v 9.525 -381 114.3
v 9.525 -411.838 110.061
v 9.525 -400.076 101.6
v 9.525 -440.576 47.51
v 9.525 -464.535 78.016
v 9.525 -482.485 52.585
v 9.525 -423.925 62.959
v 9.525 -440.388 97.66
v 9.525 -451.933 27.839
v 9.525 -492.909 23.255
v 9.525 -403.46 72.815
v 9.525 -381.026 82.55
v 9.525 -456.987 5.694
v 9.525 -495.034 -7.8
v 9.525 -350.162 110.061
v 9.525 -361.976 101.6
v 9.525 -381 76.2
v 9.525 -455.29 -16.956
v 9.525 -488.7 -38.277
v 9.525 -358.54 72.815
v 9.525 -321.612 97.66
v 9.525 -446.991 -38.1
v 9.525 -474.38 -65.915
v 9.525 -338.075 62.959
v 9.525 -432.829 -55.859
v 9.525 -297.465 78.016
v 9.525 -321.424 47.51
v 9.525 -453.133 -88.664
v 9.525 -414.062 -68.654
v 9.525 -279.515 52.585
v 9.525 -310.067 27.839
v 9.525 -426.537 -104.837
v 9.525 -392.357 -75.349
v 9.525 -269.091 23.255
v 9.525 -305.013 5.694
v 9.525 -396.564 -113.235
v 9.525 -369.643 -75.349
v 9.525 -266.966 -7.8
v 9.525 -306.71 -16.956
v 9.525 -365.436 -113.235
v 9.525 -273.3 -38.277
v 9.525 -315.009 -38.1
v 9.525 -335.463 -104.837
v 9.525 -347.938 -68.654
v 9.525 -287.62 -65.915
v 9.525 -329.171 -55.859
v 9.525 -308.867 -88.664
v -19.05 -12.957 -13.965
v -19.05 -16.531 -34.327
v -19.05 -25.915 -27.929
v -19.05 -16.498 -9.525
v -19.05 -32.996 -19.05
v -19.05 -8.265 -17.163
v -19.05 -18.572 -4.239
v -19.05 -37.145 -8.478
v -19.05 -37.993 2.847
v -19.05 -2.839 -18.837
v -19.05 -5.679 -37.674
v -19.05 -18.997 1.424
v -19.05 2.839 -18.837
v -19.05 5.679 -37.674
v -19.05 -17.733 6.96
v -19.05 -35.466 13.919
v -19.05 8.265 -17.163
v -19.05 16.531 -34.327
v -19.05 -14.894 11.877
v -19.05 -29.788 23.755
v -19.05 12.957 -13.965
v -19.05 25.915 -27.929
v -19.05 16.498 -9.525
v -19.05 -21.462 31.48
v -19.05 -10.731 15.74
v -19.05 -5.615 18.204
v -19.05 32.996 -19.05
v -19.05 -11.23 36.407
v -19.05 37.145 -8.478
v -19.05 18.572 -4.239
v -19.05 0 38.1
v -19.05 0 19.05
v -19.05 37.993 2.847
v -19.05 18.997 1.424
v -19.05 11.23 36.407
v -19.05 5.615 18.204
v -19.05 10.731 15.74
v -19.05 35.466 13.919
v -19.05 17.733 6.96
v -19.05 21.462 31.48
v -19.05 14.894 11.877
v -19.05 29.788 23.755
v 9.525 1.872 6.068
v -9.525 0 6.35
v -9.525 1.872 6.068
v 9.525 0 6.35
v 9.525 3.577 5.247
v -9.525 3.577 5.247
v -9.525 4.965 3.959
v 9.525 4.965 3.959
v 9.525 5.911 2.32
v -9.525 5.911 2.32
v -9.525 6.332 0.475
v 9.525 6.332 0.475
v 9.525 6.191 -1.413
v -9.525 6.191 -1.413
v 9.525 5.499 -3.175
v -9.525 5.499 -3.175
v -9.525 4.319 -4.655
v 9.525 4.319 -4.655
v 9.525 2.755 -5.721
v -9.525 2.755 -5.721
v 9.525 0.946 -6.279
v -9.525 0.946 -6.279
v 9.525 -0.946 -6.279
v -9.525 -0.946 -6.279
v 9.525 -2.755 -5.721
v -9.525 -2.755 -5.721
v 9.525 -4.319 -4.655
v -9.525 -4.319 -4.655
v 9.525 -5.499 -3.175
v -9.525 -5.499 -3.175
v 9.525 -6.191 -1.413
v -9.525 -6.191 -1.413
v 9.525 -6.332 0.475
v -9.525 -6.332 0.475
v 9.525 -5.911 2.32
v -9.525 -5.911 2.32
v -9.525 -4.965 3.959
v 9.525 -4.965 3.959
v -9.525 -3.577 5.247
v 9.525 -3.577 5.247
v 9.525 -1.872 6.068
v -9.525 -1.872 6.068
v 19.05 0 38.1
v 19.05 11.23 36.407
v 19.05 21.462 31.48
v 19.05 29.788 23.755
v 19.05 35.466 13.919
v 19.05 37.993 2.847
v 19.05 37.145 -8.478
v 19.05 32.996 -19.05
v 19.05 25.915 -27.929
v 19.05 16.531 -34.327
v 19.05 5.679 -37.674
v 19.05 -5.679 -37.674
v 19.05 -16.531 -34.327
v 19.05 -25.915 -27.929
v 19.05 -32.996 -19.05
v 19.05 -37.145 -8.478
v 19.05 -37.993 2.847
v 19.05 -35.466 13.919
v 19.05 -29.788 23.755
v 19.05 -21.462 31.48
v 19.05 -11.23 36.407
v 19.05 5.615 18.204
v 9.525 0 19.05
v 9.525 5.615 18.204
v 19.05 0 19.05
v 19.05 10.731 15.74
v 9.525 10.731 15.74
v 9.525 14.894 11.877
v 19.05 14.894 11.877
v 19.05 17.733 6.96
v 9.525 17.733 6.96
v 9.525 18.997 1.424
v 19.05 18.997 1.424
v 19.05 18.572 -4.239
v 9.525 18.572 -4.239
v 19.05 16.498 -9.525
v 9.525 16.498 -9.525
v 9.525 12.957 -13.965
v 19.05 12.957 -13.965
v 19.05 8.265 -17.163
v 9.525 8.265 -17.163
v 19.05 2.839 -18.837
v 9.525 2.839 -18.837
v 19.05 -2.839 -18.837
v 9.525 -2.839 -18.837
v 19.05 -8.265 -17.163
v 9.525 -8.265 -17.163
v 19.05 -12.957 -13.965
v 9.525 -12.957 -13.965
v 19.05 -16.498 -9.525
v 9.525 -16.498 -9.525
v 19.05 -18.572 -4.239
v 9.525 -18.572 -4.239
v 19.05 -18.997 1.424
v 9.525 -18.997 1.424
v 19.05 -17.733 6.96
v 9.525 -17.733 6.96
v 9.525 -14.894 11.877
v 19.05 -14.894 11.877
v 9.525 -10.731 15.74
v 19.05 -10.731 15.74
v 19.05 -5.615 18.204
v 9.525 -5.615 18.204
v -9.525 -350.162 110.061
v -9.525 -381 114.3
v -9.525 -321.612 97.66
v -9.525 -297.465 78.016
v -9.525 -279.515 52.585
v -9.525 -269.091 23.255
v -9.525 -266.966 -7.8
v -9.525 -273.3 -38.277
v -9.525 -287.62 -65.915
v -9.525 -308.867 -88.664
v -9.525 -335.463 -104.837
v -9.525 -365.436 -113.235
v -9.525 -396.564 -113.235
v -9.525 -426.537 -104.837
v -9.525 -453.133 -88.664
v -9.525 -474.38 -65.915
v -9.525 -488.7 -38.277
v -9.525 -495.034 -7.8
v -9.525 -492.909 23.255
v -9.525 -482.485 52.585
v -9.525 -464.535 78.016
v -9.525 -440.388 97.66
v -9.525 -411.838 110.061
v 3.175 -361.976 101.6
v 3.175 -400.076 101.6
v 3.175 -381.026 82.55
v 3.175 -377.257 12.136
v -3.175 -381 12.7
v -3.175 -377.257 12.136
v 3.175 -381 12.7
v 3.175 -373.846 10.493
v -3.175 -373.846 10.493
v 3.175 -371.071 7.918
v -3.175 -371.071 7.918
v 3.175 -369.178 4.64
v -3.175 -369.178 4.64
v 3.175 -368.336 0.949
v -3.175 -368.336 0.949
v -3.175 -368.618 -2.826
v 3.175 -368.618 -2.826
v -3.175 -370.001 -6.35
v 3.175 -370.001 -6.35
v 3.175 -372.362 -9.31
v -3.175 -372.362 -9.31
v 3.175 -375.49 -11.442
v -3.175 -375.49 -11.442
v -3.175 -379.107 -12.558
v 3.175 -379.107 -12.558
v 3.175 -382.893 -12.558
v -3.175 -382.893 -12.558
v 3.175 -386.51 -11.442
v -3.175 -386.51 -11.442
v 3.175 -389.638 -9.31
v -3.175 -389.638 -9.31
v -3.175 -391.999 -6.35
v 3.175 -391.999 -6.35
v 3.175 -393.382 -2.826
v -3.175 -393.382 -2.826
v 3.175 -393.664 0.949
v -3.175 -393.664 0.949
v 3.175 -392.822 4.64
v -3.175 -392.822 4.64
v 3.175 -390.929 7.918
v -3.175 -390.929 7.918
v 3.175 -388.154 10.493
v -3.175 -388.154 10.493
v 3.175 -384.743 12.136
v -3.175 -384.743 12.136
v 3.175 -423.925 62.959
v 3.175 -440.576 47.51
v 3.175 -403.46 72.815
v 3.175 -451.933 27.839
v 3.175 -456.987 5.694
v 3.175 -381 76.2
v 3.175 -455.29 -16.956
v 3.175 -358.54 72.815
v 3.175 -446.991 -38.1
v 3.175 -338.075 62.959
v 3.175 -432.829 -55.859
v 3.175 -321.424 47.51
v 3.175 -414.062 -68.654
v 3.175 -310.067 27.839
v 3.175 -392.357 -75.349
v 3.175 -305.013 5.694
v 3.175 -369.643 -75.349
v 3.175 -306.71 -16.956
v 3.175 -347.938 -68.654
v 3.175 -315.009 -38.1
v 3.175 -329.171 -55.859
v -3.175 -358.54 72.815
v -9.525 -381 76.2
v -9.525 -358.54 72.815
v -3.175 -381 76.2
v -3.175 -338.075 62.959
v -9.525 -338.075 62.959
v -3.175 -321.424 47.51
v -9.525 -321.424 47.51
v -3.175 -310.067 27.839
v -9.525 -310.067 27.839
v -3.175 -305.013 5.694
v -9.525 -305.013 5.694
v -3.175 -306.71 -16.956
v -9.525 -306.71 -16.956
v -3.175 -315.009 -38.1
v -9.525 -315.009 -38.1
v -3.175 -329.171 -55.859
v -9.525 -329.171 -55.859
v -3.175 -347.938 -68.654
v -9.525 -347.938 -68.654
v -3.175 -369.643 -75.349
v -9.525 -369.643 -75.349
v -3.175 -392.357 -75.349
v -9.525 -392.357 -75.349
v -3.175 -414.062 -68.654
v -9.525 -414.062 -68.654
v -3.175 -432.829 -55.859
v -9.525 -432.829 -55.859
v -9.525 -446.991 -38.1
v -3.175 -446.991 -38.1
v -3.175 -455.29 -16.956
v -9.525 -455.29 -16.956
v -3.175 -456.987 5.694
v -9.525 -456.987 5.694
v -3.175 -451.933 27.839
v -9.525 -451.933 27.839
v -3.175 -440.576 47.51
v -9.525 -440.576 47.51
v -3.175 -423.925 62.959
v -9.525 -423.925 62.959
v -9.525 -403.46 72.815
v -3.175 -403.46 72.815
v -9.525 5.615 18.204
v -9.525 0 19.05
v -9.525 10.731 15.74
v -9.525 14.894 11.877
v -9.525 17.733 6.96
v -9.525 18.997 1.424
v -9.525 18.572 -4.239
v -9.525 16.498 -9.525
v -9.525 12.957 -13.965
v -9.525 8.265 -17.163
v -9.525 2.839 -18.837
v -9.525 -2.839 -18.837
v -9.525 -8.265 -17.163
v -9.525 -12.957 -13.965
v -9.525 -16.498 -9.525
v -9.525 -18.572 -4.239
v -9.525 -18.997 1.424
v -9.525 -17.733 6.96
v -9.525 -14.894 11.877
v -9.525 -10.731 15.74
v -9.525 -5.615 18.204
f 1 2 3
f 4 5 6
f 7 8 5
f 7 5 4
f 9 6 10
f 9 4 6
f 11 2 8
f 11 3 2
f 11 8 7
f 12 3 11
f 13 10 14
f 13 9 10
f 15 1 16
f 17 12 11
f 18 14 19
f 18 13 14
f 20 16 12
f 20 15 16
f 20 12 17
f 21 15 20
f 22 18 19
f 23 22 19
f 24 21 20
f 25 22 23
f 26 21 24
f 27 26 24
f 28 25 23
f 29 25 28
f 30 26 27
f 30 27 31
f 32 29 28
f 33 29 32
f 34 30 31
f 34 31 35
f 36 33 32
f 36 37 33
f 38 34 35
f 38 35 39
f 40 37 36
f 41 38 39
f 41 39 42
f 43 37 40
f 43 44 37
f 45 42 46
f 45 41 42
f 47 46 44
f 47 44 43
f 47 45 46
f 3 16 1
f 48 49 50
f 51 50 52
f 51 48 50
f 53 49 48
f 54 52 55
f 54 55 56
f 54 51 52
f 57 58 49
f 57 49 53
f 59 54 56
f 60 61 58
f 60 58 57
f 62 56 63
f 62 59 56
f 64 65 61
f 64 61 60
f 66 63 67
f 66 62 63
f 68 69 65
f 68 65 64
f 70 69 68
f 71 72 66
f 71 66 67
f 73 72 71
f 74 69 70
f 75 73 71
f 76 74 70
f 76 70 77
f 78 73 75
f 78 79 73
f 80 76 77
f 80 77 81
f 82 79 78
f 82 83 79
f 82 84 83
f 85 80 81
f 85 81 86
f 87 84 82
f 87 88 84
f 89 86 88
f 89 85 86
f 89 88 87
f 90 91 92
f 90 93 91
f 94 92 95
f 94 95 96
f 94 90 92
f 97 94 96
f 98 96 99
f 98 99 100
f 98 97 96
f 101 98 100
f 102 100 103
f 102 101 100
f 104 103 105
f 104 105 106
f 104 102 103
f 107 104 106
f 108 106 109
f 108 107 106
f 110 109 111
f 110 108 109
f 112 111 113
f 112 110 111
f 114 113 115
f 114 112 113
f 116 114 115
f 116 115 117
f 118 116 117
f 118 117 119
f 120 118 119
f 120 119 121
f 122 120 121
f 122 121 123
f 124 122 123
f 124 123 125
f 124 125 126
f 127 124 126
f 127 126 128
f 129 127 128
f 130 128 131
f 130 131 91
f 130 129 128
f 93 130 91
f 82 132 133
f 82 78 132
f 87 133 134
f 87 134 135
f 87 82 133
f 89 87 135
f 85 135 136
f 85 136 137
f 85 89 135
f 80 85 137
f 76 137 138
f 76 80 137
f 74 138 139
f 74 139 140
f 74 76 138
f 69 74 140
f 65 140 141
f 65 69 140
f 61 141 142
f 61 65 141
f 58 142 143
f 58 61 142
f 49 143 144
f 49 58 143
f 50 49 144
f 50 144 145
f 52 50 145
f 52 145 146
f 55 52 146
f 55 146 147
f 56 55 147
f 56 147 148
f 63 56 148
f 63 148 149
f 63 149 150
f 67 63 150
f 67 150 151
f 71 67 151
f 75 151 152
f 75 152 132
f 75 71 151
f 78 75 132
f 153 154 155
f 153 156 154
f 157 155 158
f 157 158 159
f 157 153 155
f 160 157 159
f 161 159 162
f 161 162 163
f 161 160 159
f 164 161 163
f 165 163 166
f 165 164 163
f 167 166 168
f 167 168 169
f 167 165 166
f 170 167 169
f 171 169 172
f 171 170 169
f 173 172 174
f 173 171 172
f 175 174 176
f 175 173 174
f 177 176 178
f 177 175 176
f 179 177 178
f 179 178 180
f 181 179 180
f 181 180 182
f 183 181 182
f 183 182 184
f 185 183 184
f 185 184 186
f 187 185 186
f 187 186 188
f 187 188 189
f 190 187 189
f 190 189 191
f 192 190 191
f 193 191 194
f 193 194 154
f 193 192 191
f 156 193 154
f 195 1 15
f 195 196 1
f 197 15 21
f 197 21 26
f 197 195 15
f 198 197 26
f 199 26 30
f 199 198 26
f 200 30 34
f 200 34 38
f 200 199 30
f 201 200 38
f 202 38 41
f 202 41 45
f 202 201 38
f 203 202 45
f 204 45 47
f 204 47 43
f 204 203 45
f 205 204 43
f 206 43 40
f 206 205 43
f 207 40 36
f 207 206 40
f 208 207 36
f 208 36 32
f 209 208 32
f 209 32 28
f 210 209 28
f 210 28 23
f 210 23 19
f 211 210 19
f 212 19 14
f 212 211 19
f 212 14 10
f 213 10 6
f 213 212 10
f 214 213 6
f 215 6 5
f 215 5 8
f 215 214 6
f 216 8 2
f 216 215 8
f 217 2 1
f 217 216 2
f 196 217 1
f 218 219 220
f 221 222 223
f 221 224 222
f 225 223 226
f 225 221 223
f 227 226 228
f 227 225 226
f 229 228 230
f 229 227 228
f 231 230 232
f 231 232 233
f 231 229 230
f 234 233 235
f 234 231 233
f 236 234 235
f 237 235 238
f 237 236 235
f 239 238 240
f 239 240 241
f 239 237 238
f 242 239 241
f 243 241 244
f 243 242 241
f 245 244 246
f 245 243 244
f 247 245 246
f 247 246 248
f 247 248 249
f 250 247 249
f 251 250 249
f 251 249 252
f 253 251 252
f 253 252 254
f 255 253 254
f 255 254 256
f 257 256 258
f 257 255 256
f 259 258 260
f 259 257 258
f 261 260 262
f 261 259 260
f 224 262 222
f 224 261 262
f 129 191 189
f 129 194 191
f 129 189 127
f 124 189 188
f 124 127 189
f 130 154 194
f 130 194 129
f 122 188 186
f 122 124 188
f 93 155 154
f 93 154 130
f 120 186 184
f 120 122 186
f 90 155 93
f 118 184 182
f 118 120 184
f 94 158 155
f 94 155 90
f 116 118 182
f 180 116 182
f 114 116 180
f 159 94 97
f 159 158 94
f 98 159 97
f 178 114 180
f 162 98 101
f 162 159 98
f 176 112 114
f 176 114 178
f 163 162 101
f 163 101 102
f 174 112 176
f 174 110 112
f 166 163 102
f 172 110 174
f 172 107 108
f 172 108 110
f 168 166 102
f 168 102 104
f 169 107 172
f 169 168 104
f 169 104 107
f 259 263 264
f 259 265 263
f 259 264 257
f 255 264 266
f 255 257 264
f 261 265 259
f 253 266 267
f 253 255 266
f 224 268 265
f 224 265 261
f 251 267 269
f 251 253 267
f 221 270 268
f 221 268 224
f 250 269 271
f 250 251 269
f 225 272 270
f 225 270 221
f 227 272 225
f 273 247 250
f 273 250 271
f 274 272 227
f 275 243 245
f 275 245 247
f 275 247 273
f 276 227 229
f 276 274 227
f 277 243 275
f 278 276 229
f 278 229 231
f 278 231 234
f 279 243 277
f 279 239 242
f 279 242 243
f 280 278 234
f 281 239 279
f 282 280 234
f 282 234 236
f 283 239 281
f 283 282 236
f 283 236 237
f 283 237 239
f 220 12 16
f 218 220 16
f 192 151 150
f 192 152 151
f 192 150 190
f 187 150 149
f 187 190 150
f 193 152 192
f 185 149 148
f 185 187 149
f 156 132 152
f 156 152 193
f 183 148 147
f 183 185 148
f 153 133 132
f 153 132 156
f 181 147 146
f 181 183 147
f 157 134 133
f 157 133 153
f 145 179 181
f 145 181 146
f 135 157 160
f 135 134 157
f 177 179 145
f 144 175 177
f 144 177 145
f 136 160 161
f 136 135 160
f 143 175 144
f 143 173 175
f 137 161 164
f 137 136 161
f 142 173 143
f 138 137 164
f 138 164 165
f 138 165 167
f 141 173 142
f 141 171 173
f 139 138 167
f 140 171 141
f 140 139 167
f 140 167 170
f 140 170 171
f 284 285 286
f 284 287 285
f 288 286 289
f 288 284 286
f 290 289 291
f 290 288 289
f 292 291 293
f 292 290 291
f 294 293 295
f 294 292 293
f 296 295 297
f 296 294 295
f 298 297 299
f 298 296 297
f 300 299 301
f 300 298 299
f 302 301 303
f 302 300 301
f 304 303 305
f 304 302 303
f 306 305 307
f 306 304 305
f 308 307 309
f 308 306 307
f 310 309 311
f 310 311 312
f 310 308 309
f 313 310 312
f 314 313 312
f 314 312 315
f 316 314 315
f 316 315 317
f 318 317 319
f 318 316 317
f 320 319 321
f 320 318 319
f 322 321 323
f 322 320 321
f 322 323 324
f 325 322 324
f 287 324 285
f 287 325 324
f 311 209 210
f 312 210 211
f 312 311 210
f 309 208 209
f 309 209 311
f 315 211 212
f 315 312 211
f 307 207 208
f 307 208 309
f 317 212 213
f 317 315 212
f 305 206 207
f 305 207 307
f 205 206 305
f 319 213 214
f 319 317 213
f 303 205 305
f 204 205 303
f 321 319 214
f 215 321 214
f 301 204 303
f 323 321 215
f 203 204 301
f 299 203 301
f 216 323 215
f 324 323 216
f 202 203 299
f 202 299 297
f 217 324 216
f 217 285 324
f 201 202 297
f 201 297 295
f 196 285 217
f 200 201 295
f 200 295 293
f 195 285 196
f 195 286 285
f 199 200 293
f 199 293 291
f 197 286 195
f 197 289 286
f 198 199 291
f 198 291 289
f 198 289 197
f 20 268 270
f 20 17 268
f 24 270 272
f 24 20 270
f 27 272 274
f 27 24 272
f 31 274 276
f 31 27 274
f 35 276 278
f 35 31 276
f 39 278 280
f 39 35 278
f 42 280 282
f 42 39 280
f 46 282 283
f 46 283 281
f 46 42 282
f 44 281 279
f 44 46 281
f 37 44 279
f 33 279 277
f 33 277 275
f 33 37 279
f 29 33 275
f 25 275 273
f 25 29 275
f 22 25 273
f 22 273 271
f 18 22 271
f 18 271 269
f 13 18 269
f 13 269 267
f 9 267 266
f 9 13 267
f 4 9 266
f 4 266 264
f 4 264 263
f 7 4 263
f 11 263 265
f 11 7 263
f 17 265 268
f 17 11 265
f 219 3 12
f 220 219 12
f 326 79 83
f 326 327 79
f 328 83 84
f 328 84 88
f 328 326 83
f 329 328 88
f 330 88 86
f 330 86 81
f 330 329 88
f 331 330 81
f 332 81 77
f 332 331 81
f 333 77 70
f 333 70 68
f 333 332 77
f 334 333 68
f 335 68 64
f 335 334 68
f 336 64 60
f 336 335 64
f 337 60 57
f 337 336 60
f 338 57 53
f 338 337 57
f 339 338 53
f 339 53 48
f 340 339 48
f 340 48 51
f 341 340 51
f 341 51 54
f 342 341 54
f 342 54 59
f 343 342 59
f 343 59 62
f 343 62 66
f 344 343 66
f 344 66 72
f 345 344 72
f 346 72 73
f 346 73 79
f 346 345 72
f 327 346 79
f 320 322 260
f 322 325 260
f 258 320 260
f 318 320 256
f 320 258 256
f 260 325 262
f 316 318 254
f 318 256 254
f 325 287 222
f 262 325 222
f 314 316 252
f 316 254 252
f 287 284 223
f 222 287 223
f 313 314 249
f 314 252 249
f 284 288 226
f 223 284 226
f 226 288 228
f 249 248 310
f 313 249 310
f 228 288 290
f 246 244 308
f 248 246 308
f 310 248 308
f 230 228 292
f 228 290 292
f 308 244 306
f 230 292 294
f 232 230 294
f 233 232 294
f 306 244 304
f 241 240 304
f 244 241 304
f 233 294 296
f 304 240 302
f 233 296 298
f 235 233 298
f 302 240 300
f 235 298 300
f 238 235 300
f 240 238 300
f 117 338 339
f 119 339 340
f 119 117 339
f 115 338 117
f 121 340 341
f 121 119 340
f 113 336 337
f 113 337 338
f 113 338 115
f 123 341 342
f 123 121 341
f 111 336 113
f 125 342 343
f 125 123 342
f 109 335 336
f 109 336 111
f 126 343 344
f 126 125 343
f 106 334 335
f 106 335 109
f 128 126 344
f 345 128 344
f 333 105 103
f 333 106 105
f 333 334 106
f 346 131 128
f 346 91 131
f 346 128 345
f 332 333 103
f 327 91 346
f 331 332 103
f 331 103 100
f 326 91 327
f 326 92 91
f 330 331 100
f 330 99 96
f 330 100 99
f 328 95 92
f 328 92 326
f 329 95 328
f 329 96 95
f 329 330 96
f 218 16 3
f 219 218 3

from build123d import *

# Parameters (mm, degrees)
F3_W     = 6.35
F3_H     = 63.5
F6_DEPTH = 6.35


with BuildPart() as f1:
    # F0 (on Front) → F1 (revolve)
    with BuildSketch(Plane.XZ):
        Polygon((-19.05, 19.05), (-9.525, 19.05), (-9.525, 6.35), (0, 6.35), (0, 38.1), (-19.05, 38.1), align=None)
        Polygon((0, 38.1), (0, 6.35), (9.525, 6.35), (9.525, 19.05), (19.05, 19.05), (19.05, 38.1), align=None)
    revolve(axis=Axis((0, 0, 0), (-1, 0, 0)))


with BuildPart() as f4:
    # F3 (on offset) → F4 (revolve)
    with BuildSketch(Plane.XZ.offset(381)):
        with Locations((0, 44.45)):
            Rectangle(F3_W, F3_H)
        Polygon((-3.175, 76.2), (3.175, 76.2), (9.525, 76.2), (9.525, 114.3), (-9.525, 114.3), (-9.525, 76.2), align=None)
    revolve(axis=Axis((0, -381, 0), (-1, 0, 0)))

    # F5 (on face) → F6 (cut)
    with BuildSketch(Plane.YZ.offset(9.525)):
        Polygon((-381.026096, 101.599996), (-400.076096, 101.599996), (-381.026096, 82.549996), align=None)
        Polygon((-381.026096, 101.599996), (-381.026096, 82.549996), (-361.976096, 101.599996), align=None)
    extrude(amount=-F6_DEPTH, mode=Mode.SUBTRACT)


solid = Compound([f1.part, f4.part])
